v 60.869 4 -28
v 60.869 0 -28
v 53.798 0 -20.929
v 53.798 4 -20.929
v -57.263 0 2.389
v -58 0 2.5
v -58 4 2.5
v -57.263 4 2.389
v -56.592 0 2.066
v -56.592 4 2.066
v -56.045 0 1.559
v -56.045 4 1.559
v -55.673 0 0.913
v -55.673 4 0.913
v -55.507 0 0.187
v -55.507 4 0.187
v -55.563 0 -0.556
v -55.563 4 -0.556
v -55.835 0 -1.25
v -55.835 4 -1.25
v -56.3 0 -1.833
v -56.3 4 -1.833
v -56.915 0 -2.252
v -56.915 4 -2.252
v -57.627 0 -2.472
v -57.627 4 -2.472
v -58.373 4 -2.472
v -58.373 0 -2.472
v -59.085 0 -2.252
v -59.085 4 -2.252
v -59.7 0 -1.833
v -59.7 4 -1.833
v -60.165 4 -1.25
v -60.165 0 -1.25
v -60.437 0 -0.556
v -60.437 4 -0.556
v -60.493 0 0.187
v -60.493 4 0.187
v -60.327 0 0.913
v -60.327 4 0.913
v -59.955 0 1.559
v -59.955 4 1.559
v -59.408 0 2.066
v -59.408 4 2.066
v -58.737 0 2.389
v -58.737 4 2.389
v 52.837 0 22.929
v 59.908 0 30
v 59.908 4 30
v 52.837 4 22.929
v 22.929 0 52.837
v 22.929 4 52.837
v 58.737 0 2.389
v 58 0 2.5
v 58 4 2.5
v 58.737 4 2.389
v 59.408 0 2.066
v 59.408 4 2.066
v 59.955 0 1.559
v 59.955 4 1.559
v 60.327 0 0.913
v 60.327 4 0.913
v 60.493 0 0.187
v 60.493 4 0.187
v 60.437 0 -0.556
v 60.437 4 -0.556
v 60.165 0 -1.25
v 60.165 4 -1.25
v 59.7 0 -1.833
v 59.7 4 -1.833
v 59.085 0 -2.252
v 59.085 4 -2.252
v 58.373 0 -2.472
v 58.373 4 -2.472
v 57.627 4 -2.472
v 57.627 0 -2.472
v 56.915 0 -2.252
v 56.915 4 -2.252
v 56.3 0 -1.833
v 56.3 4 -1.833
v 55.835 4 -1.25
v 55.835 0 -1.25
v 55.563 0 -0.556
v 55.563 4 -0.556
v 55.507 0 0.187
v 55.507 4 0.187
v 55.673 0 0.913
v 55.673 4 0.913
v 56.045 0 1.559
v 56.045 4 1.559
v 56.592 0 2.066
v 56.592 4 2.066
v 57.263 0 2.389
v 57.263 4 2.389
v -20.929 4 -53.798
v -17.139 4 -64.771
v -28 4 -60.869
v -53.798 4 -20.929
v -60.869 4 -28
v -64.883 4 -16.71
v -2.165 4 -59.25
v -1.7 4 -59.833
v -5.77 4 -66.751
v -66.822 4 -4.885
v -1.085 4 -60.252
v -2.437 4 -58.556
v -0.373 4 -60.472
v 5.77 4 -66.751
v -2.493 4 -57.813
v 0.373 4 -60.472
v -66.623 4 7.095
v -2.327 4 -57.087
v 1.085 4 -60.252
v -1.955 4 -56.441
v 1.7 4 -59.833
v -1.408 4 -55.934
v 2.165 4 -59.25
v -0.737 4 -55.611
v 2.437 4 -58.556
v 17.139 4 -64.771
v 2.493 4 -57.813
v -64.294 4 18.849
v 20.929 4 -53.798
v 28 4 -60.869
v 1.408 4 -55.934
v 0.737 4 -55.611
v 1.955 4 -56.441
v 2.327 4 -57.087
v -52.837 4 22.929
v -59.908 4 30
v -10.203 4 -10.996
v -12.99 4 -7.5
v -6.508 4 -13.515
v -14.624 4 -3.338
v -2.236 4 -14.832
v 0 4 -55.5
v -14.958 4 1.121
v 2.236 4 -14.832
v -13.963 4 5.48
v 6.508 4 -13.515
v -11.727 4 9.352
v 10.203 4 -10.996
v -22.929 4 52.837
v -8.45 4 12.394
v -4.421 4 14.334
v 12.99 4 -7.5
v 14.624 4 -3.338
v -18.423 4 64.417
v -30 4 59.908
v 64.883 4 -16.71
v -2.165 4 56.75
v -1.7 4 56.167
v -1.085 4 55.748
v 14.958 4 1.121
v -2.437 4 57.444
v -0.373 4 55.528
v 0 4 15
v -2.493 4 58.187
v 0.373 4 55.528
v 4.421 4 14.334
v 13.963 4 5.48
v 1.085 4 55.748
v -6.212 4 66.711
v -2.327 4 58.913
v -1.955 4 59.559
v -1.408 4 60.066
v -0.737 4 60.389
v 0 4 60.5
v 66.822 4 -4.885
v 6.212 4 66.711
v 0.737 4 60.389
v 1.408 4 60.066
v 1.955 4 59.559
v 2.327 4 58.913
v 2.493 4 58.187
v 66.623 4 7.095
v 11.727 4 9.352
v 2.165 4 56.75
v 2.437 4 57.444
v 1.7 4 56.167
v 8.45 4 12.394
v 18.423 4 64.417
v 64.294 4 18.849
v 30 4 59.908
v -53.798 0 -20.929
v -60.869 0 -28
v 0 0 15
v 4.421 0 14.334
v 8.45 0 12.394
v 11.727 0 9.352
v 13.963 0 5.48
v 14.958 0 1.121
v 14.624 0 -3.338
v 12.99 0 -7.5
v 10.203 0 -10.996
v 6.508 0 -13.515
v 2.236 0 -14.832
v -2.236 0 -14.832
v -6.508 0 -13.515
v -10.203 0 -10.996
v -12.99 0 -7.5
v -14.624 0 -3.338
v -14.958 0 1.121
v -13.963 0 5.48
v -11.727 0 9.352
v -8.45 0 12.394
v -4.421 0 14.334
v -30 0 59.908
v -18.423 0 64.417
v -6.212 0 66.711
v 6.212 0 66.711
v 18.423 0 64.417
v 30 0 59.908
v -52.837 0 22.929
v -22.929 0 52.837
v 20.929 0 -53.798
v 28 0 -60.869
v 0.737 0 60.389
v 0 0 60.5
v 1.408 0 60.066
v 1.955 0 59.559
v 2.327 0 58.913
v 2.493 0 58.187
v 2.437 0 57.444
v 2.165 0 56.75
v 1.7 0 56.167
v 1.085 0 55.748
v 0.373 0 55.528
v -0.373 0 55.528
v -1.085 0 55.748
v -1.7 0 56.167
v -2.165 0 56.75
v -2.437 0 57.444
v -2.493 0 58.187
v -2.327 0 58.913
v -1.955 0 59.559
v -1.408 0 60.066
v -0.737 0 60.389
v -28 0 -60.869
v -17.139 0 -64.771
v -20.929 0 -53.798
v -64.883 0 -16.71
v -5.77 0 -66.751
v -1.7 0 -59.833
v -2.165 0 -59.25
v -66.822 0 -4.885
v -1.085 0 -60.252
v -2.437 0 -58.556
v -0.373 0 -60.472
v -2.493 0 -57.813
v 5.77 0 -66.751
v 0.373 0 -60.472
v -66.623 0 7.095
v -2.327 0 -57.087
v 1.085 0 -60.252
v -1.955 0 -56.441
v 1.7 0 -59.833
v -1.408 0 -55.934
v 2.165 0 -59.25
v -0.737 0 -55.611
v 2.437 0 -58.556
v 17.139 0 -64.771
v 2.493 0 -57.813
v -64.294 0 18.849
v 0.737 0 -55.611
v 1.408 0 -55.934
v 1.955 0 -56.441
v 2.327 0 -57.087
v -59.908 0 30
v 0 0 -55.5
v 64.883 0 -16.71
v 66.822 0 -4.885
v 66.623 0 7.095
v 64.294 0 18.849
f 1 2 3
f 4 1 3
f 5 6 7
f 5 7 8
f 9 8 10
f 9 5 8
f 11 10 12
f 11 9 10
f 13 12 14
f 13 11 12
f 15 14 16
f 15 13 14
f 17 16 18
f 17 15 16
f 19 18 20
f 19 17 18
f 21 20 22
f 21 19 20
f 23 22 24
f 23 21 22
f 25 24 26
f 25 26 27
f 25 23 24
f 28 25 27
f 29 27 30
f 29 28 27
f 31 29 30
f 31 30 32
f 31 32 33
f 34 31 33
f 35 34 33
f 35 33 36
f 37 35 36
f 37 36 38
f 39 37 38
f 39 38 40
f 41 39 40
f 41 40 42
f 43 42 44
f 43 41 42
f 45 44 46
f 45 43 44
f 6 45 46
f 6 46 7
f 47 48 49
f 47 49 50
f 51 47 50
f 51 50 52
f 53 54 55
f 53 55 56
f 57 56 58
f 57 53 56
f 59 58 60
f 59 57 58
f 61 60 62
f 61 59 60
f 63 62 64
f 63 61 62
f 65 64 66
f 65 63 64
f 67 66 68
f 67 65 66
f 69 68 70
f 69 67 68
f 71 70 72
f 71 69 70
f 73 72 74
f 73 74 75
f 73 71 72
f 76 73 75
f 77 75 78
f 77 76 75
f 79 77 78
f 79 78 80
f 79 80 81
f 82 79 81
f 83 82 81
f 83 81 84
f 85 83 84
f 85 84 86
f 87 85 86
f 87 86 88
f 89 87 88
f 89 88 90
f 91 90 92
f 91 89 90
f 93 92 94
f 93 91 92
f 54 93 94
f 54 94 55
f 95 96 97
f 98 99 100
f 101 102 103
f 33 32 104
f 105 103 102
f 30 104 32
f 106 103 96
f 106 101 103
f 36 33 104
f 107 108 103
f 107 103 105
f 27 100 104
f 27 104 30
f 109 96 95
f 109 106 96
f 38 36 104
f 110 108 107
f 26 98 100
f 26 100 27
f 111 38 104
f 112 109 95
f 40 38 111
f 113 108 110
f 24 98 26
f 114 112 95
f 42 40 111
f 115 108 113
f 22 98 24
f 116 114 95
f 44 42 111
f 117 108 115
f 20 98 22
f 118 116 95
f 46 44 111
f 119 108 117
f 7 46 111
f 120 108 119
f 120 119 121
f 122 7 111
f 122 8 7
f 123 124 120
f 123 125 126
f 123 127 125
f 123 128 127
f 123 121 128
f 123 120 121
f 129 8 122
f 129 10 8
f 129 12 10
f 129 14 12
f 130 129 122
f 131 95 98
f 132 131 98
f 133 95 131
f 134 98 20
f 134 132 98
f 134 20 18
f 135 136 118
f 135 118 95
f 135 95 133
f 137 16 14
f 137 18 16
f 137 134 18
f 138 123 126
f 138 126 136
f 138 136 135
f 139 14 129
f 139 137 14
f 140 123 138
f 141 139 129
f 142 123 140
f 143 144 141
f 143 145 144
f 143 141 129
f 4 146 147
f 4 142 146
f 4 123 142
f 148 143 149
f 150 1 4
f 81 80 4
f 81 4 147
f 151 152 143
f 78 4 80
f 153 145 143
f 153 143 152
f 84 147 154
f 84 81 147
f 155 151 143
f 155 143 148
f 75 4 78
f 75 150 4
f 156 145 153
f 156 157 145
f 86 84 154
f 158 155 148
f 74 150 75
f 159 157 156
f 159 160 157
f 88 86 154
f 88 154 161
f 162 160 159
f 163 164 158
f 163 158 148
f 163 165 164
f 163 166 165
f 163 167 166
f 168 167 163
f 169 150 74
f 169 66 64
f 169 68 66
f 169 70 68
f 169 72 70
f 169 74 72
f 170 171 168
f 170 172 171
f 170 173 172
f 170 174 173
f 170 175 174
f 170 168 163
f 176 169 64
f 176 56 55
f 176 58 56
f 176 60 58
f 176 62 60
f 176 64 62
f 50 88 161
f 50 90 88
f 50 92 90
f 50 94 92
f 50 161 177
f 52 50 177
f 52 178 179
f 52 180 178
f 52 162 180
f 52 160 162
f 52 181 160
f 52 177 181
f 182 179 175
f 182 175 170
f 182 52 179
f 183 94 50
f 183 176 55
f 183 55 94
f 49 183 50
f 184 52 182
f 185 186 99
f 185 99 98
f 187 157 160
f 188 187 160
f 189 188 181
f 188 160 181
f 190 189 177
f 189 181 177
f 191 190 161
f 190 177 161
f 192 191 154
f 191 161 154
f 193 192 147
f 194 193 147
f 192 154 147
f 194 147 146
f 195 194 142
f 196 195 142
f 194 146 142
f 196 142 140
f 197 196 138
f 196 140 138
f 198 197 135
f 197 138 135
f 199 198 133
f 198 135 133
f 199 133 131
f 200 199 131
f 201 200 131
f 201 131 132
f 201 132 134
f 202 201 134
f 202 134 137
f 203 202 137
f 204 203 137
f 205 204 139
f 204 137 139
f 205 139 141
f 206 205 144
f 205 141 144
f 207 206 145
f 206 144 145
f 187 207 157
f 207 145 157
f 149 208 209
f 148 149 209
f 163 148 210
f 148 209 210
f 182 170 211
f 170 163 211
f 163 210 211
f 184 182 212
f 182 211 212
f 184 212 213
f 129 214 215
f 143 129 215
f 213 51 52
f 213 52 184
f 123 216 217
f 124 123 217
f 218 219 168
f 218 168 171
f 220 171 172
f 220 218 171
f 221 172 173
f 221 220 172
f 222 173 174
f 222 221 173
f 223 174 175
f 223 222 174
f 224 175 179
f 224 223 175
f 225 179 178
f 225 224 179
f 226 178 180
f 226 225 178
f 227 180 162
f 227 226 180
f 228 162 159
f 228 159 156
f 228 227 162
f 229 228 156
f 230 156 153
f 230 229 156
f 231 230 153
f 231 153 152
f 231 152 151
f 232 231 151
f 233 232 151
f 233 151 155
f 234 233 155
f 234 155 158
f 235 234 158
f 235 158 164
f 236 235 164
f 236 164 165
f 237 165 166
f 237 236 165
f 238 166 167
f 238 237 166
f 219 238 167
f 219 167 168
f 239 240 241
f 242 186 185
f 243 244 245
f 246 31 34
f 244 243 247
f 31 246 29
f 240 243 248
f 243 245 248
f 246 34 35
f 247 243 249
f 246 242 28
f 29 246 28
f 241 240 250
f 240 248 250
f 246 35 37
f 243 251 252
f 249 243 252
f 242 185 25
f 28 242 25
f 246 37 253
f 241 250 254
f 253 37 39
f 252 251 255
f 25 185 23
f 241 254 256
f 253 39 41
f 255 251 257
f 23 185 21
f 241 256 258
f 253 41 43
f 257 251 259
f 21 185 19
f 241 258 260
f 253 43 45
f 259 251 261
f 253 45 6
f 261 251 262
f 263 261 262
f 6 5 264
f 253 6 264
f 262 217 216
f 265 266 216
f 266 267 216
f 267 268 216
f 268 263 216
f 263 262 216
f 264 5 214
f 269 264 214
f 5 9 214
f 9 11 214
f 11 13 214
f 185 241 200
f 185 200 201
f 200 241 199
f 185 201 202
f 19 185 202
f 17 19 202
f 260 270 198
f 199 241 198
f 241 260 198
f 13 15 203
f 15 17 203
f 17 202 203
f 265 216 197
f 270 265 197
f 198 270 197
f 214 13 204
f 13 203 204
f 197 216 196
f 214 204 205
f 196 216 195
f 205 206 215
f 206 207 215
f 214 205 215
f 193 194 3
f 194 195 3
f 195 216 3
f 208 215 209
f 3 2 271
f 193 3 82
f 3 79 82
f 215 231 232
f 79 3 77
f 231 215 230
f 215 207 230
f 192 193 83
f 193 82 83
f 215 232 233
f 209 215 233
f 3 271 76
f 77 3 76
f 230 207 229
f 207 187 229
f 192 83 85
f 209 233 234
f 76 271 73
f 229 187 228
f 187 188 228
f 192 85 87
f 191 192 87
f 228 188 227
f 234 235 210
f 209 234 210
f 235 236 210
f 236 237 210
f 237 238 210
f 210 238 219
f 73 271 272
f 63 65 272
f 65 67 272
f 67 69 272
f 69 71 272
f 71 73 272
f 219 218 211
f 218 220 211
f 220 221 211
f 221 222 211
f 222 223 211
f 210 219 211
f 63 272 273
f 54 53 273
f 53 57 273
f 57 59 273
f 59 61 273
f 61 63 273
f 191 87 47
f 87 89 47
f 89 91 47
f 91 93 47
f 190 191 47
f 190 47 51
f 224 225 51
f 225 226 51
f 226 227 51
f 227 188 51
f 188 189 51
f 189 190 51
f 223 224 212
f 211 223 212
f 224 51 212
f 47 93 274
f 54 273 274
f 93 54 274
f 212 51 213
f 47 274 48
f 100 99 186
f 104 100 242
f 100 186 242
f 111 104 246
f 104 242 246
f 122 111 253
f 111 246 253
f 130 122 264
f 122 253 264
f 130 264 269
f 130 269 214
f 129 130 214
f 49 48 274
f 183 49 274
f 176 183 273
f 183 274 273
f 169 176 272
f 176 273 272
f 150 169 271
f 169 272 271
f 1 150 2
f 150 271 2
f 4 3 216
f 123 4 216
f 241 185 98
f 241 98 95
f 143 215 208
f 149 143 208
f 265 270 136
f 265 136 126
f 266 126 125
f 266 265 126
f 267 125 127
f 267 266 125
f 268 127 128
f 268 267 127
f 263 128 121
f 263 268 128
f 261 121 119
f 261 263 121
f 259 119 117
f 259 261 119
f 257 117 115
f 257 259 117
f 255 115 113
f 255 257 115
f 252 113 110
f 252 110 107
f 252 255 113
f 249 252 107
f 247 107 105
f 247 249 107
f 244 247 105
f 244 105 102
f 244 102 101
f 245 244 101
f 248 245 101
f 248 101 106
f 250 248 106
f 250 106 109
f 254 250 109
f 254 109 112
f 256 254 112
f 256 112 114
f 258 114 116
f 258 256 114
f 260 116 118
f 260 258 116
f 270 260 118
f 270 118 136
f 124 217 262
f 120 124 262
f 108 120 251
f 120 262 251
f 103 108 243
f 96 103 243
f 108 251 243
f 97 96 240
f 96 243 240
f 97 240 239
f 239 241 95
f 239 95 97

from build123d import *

# Parameters (mm, degrees)
SKETCH1_R           = 67
SKETCH1_R_2         = 2.5
BOSS_EXTRUDE1_DEPTH = 4
SKETCH2_R           = 15
CUT_EXTRUDE1_DEPTH  = 4
CUT_EXTRUDE2_DEPTH  = 10


with BuildPart() as part:
    # Sketch1 → Boss-Extrude1 (new body)
    with BuildSketch(Plane(origin=(0, 0, 0), x_dir=(1, 0, 0), z_dir=(0, 1, 0))):
        with Locations(Location((0, 0, 0), (0, 0, 270))):
            Circle(SKETCH1_R)
        with Locations(Location((-58, 0, 0), (0, 0, 270))):
            Circle(SKETCH1_R_2, mode=Mode.SUBTRACT)
        with Locations(Location((0, -58, 0), (0, 0, 270))):
            Circle(SKETCH1_R_2, mode=Mode.SUBTRACT)
        with Locations(Location((58, 0, 0), (0, 0, 270))):
            Circle(SKETCH1_R_2, mode=Mode.SUBTRACT)
        with Locations(Location((0, 58, 0), (0, 0, 270))):
            Circle(SKETCH1_R_2, mode=Mode.SUBTRACT)
    extrude(amount=BOSS_EXTRUDE1_DEPTH)

    # Sketch2 → Cut-Extrude1 (cut)
    with BuildSketch(Plane(origin=(0, 4, 0), x_dir=(1, 0, 0), z_dir=(0, 1, 0))):
        with Locations(Location((0, 0, 0), (0, 0, 270))):
            Circle(SKETCH2_R)
    extrude(amount=-CUT_EXTRUDE1_DEPTH, mode=Mode.SUBTRACT)

    # Sketch4 → Cut-Extrude2 (cut)
    with BuildSketch(Plane.XZ):
        with BuildLine():
            Line((59.908263203, 30), (52.837195391, 22.928932188))
            Line((52.837195391, 22.928932188), (22.928932188, 52.837195391))
            Line((22.928932188, 52.837195391), (30, 59.908263203))
            ThreePointArc((30, 59.908263203), (47.376154339, 47.376154339), (59.908263203, 30))
        make_face()
        with BuildLine():
            Line((-59.908263203, 30), (-52.837195391, 22.928932188))
            Line((-52.837195391, 22.928932188), (-22.928932188, 52.837195391))
            Line((-22.928932188, 52.837195391), (-30, 59.908263203))
            ThreePointArc((-30, 59.908263203), (-47.376154339, 47.376154339), (-59.908263203, 30))
        make_face()
        with BuildLine():
            Line((-53.797643362, -20.928932188), (-20.928932188, -53.797643362))
            Line((-20.928932188, -53.797643362), (-28, -60.868711174))
            ThreePointArc((-28, -60.868711174), (-47.376154339, -47.376154339), (-60.868711174, -28))
            Line((-60.868711174, -28), (-53.797643362, -20.928932188))
        make_face()
        with BuildLine():
            Line((53.797643362, -20.928932188), (20.928932188, -53.797643362))
            Line((20.928932188, -53.797643362), (28, -60.868711174))
            ThreePointArc((28, -60.868711174), (47.376154339, -47.376154339), (60.868711174, -28))
            Line((60.868711174, -28), (53.797643362, -20.928932188))
        make_face()
    extrude(amount=-CUT_EXTRUDE2_DEPTH, mode=Mode.SUBTRACT)


solid = part.part
